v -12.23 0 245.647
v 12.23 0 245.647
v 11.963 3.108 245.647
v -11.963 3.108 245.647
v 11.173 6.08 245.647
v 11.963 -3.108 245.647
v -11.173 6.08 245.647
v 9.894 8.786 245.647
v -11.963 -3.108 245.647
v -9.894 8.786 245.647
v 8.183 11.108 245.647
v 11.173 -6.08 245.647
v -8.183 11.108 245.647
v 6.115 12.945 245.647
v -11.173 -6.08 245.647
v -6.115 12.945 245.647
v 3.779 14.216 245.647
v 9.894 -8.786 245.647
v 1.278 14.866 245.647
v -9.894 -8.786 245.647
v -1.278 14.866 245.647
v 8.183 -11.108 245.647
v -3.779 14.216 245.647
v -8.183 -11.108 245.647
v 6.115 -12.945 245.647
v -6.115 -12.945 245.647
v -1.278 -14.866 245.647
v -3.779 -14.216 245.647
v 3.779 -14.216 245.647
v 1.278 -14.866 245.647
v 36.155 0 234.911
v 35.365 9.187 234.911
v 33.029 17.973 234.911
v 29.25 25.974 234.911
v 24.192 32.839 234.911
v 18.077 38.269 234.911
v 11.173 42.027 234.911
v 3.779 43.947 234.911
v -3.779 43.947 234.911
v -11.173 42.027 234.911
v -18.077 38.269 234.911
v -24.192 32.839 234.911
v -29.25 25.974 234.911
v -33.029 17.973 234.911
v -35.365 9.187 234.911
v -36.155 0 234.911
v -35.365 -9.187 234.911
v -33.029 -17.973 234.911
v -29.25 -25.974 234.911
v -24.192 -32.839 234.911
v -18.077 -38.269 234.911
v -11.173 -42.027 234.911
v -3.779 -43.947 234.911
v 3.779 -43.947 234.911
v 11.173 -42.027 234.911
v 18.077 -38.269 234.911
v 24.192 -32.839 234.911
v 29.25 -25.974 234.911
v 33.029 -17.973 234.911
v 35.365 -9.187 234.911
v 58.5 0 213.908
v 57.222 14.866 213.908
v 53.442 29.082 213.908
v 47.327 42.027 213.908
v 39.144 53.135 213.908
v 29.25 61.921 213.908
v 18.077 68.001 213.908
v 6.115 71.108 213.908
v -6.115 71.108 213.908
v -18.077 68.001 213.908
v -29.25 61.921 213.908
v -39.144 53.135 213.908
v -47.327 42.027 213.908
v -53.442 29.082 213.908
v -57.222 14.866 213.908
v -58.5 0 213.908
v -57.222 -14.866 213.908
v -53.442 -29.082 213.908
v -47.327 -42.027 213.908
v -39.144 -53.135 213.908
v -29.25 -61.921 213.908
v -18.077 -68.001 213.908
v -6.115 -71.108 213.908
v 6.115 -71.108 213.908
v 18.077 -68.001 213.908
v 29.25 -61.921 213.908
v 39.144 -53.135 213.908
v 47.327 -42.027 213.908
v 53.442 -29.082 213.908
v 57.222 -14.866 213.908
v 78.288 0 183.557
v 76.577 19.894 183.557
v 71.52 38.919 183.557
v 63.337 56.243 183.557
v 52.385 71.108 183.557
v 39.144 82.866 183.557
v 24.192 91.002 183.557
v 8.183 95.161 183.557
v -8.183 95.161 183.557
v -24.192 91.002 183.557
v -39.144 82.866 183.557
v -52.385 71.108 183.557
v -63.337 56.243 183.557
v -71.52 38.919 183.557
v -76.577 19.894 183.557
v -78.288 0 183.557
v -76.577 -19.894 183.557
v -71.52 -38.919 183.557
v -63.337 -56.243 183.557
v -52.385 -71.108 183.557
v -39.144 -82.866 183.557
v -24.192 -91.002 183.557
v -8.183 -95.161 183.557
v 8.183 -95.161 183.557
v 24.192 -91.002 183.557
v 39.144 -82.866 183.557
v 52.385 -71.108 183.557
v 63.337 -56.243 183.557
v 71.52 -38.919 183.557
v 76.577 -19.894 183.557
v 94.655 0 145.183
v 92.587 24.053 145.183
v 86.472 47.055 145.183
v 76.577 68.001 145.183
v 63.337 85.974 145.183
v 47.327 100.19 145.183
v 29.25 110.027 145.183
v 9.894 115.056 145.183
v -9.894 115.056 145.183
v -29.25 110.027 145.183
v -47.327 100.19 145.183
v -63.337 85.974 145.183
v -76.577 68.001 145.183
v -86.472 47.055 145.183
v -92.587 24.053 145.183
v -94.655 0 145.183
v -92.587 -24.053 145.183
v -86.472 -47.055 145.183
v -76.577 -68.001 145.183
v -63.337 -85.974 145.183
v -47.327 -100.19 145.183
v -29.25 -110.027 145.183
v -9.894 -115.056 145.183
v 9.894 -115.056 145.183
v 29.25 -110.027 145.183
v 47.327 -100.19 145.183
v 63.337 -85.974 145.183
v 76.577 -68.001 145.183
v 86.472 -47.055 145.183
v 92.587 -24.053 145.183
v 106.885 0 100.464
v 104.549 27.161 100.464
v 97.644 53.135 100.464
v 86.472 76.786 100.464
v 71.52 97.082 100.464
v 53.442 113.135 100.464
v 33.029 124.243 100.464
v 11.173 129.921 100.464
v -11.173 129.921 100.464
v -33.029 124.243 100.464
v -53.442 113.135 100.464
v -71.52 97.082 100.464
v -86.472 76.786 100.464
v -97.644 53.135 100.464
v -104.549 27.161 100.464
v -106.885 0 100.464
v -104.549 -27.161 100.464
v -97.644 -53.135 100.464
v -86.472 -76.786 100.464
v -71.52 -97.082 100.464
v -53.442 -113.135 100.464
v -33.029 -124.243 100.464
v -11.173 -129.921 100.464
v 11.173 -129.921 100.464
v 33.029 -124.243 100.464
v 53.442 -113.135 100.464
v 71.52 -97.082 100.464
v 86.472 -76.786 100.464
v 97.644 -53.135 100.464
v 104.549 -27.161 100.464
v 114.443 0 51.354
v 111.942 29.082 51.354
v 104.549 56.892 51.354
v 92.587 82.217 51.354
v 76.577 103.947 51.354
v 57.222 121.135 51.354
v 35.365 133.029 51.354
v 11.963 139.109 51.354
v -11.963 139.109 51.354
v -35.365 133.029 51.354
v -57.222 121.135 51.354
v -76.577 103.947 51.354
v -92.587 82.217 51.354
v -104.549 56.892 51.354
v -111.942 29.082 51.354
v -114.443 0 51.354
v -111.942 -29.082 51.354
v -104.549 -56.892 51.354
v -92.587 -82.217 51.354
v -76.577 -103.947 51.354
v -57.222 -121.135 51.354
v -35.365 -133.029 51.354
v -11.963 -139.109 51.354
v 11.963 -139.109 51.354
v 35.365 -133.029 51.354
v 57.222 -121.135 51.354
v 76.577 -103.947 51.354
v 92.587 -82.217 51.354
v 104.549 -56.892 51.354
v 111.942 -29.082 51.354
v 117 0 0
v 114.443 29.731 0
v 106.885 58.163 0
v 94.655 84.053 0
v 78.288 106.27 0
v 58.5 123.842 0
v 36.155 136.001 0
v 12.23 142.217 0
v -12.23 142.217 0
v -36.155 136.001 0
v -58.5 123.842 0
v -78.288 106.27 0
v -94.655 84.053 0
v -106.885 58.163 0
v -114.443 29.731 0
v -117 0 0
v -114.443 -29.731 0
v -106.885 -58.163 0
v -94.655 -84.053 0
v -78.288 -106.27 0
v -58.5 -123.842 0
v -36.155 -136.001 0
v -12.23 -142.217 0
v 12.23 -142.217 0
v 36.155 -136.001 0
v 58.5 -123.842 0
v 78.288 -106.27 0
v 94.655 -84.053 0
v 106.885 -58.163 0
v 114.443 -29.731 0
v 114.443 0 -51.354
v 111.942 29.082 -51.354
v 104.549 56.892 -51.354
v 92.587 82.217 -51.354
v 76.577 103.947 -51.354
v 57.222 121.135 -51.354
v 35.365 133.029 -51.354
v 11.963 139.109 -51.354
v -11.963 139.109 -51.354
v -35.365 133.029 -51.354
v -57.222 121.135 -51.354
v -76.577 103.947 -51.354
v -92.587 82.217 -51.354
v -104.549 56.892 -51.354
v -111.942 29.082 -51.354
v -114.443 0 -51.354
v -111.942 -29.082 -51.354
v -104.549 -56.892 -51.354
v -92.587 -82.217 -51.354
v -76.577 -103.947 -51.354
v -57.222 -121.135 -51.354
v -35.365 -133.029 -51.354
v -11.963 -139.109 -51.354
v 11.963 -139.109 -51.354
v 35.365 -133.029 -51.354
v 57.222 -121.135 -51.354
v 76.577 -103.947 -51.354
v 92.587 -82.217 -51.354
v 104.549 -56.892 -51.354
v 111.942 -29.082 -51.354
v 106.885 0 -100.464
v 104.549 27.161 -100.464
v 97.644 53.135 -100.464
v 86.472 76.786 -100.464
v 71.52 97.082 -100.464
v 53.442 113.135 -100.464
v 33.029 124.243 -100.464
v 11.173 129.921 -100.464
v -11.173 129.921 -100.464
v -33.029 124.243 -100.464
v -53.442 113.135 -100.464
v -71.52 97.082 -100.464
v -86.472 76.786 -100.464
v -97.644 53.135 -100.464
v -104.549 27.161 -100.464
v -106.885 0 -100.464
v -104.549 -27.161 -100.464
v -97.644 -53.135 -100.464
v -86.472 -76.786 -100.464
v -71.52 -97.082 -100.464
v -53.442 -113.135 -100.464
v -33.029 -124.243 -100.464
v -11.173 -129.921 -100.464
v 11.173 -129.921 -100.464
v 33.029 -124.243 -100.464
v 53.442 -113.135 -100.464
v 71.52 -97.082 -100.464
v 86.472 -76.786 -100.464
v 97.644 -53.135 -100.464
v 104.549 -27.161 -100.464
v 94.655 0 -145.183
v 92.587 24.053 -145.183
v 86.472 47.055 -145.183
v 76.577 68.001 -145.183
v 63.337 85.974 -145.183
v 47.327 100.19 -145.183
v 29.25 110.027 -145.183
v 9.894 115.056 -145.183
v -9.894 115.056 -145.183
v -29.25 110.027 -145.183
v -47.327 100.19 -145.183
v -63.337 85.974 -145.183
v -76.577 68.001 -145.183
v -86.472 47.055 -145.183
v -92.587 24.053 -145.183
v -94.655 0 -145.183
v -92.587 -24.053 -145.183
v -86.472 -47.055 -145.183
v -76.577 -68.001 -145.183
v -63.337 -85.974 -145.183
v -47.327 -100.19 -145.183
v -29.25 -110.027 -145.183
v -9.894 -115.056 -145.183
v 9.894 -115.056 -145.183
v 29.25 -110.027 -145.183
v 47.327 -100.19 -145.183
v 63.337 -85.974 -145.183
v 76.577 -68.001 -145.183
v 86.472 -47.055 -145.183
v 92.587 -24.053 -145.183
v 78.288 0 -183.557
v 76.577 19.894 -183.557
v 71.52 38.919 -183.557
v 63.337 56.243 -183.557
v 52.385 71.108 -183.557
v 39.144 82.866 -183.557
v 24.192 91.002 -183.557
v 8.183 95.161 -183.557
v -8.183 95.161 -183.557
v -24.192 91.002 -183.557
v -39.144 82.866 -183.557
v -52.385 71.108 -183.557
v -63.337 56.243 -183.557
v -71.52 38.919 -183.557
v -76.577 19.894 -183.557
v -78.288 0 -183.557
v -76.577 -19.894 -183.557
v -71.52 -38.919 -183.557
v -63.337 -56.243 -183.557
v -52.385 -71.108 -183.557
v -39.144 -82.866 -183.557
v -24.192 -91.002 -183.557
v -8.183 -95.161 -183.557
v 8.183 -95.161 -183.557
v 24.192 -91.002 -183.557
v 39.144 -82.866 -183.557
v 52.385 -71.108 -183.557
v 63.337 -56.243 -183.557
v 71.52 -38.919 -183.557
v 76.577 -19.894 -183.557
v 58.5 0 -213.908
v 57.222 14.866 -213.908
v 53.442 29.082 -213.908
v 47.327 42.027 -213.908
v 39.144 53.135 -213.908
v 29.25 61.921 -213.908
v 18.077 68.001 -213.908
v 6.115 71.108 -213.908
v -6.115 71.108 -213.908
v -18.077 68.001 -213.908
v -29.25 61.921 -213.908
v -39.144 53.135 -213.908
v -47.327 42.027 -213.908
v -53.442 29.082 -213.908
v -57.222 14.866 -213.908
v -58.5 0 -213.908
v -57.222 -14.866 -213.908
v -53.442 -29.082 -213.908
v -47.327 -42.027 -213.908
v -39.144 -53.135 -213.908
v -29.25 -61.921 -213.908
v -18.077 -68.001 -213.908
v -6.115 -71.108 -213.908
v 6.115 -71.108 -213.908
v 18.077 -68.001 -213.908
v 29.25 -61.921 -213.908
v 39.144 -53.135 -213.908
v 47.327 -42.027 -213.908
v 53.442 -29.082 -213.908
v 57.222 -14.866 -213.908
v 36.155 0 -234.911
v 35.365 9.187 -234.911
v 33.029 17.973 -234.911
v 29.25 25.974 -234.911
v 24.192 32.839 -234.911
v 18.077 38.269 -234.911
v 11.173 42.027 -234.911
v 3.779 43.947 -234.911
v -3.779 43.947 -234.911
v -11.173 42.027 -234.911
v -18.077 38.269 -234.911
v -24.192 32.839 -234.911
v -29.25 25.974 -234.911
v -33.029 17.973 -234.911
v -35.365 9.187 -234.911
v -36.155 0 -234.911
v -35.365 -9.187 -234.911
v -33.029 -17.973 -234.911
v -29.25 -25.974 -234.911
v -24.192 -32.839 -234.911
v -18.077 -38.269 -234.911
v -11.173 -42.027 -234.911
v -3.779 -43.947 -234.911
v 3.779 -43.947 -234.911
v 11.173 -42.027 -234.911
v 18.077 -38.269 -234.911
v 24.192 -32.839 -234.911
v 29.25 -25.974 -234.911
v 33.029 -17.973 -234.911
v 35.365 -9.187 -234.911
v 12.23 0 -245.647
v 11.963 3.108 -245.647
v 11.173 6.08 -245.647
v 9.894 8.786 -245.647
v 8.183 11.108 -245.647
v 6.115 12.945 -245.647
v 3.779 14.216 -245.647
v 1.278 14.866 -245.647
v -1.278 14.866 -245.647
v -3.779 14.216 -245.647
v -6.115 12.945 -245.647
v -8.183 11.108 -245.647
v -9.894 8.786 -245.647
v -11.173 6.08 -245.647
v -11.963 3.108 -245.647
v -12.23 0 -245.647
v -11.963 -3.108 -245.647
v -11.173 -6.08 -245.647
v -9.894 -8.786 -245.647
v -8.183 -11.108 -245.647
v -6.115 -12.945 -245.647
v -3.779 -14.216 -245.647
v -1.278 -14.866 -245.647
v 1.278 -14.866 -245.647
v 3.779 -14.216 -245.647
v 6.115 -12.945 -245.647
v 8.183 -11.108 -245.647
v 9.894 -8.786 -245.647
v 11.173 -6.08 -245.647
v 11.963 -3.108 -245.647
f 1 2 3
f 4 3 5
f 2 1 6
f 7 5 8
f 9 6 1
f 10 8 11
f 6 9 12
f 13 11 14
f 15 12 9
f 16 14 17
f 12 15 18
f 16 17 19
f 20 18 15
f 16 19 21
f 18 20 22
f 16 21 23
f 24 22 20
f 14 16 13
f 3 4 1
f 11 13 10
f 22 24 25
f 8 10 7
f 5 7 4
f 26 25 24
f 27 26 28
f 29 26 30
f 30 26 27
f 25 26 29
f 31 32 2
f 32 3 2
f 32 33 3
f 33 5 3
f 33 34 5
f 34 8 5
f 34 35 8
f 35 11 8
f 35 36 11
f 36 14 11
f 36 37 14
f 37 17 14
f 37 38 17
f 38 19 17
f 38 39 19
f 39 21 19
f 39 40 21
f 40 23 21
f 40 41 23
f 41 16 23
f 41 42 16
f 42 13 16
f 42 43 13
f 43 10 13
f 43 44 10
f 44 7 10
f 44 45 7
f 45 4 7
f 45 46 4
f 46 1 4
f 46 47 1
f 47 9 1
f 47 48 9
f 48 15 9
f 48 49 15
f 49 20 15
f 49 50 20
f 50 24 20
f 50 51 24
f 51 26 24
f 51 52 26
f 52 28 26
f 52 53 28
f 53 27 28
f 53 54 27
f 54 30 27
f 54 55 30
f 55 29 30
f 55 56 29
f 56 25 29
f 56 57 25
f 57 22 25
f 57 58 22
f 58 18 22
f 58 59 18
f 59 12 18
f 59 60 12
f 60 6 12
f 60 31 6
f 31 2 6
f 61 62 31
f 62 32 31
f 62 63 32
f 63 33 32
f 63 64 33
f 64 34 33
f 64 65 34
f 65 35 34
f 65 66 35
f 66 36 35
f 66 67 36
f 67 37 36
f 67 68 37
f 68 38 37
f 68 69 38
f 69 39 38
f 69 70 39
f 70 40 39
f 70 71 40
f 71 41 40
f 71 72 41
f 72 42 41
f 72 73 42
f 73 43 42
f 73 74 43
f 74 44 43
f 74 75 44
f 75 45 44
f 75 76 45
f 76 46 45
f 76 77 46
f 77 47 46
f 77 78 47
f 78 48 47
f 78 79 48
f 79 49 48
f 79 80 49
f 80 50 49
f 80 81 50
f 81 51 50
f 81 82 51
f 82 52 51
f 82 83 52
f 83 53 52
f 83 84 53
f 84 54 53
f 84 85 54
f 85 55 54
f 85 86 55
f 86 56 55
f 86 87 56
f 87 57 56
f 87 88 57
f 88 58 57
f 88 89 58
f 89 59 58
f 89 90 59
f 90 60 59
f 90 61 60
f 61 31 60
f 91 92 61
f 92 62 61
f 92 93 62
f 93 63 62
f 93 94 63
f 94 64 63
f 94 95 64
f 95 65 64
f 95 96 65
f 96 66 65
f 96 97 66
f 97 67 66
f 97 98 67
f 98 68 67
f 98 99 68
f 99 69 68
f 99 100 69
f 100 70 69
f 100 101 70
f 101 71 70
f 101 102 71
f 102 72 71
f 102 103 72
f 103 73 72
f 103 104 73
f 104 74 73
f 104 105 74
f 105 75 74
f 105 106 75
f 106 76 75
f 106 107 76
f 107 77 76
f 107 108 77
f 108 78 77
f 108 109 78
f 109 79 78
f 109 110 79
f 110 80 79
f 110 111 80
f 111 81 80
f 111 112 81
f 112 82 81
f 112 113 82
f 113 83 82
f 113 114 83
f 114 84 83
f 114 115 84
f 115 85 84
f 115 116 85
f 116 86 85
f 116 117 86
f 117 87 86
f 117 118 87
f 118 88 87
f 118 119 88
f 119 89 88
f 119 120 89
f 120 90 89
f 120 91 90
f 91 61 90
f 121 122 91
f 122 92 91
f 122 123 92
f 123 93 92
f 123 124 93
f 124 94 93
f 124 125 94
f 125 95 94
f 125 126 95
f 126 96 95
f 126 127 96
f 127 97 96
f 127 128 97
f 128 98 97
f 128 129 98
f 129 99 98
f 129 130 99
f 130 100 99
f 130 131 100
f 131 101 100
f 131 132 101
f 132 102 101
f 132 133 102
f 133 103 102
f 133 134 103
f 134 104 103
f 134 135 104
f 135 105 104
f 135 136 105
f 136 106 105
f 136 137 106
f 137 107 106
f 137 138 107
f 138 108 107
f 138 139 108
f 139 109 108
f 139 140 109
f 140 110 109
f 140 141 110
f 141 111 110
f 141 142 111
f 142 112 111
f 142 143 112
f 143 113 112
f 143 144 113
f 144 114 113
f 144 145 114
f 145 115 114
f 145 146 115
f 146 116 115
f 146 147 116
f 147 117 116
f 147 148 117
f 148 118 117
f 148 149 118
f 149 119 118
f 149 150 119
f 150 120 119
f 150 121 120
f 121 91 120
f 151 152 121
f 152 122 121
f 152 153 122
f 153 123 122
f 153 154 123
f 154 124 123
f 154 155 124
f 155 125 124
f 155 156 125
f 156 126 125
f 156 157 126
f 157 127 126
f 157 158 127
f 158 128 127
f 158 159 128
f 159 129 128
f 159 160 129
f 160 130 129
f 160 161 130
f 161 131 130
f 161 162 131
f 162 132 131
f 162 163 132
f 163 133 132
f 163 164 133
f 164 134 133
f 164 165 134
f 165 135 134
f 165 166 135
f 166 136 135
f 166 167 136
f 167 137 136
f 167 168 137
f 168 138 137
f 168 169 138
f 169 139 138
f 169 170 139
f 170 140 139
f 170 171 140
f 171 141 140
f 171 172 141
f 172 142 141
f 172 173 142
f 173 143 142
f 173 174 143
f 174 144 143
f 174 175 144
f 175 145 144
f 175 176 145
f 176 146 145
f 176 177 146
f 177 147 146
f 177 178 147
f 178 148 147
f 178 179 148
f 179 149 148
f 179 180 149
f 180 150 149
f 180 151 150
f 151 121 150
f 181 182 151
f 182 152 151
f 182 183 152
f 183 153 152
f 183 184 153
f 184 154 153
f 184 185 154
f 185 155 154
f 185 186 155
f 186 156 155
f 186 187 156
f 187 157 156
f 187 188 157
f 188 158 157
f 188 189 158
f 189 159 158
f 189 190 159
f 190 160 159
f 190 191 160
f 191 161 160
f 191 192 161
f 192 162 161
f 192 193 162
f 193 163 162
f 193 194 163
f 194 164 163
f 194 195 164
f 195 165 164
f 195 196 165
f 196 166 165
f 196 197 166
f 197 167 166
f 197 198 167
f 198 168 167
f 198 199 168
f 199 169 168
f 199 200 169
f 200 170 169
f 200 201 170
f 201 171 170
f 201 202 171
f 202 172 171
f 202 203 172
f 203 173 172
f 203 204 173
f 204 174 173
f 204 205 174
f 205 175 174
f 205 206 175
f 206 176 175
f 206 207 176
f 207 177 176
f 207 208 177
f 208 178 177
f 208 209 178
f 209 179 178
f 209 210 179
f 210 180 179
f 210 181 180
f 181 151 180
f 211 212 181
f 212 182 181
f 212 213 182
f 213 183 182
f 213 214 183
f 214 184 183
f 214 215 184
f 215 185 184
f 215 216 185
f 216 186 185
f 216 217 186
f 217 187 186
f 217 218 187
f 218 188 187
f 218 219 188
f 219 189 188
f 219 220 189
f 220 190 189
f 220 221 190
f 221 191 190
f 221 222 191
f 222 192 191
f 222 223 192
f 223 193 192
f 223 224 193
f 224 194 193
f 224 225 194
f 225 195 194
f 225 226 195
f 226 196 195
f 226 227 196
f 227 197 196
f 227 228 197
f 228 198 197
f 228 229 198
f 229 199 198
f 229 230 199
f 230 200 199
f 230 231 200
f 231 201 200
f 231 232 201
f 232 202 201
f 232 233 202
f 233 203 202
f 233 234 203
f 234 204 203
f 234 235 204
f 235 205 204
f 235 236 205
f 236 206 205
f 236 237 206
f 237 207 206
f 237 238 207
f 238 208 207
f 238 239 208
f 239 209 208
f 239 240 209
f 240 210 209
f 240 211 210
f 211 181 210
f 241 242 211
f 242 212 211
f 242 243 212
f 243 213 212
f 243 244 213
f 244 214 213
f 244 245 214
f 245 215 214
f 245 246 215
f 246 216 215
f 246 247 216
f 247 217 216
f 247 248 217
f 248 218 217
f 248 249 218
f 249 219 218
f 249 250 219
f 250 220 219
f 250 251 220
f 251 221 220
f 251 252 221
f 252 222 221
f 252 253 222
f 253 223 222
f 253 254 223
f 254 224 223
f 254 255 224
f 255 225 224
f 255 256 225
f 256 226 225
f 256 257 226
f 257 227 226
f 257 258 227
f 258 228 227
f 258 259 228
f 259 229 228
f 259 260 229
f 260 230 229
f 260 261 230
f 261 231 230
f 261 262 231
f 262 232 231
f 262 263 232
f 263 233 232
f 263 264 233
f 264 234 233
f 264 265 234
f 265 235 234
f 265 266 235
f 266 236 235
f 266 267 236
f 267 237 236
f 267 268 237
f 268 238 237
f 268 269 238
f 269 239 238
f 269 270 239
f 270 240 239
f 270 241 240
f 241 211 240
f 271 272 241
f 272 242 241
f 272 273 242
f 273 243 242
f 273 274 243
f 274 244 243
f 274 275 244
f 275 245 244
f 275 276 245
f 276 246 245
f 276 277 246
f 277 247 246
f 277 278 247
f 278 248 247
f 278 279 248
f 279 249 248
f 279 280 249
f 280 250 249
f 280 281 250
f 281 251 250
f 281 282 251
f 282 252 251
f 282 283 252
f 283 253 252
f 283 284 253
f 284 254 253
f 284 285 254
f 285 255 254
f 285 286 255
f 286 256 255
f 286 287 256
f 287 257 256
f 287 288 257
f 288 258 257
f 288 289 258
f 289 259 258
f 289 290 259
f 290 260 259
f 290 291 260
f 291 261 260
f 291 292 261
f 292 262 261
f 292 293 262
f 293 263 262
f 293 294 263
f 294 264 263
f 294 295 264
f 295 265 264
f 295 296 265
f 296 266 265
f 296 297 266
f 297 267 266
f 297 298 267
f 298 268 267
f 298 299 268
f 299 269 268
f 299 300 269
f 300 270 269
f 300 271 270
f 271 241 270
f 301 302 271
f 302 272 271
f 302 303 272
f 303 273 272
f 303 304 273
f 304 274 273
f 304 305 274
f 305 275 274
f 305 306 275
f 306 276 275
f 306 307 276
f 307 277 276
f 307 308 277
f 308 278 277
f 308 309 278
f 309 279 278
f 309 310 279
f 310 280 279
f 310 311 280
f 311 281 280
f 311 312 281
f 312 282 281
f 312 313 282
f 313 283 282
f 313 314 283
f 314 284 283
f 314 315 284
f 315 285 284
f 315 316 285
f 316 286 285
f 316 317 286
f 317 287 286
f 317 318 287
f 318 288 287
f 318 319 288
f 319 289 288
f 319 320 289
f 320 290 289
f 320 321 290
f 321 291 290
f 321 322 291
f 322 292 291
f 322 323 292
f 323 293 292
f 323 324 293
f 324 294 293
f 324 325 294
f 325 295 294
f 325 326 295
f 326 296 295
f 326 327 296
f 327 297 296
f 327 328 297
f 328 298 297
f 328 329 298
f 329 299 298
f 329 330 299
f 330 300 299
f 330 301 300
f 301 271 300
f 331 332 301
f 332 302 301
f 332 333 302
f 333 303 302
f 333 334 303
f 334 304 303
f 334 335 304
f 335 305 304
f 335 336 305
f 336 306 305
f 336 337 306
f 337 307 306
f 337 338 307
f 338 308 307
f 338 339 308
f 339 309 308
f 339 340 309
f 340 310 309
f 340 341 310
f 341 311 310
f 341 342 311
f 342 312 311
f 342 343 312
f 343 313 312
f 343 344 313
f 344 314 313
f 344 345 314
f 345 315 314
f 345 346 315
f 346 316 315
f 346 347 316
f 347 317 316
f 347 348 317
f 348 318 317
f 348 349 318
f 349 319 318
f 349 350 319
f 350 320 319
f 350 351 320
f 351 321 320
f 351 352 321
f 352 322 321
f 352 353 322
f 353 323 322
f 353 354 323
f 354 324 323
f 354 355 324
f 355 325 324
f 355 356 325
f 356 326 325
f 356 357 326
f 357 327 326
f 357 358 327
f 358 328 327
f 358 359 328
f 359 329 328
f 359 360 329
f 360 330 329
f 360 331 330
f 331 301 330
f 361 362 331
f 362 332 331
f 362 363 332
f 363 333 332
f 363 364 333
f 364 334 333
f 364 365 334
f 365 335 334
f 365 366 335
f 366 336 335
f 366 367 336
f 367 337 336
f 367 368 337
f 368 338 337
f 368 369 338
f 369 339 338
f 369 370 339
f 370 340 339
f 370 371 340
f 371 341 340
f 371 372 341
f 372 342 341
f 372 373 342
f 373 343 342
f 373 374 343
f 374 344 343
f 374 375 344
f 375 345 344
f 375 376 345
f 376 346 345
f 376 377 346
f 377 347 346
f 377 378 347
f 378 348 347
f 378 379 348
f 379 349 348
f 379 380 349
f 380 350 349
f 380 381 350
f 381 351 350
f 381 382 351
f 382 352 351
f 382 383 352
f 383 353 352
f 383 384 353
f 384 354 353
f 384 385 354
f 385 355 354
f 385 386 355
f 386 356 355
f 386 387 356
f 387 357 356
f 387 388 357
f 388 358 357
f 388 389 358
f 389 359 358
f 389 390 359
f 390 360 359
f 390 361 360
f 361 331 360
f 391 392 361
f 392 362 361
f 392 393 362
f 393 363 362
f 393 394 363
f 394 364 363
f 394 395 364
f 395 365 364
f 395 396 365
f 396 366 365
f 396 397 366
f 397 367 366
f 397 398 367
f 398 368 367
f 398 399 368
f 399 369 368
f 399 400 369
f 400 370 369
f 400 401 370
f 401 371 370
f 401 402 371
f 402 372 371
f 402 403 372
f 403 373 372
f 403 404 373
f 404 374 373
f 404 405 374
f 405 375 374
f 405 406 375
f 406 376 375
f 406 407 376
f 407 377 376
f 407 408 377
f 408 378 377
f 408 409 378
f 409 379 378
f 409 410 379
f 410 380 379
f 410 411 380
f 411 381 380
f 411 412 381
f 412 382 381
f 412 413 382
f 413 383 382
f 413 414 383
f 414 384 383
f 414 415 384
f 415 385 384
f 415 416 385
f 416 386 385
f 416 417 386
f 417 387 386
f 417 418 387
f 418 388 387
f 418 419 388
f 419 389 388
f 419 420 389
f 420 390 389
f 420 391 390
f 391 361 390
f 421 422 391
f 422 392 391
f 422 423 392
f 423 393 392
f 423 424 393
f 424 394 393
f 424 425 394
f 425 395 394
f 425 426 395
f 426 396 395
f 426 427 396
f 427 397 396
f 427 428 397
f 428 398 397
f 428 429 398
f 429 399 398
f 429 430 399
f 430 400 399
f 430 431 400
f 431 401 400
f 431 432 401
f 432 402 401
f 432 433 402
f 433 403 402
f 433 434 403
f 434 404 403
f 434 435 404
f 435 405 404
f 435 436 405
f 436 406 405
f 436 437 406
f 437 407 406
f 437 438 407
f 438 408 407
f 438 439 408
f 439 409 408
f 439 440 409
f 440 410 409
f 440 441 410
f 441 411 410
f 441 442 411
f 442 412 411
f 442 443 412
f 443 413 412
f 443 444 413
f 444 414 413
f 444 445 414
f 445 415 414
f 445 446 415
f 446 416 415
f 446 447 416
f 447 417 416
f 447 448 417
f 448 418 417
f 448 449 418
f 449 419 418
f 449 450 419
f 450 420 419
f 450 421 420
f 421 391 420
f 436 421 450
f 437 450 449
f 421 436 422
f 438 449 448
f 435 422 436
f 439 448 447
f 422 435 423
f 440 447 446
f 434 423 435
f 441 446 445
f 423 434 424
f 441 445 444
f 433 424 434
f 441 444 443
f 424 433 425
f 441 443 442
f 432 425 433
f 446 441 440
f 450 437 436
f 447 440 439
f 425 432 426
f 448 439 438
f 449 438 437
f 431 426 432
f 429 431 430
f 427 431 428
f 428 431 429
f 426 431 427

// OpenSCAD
// Generated by SolidPython 1.0.1 on 2020-07-29 00:46:48


scale(v = [9, 11, 19]) {
	sphere(r = 13);
}
/***********************************************
*********      SolidPython code:      **********
************************************************
 
# import packages: SolidPython
from solid import *
from solid.utils import *
from itertools import chain, combinations, permutations


class Resize:

    def __init__(self, scad_file):
        self.scad_file = scad_file
        #self.scad_file = import_scad(scad_file)
        # cone/cylinder param:
        self.r1 = 0
        self.r2 = 0
        self.h = 0
        # rectangular prism param:
        self.w = 0
        self.l = 0
        # ellipse param:
        self.r = 0

    # import OpenScad code (file name corresponds to shape)


    # classify shape + parameters
    def assign(self, param1, param2, param3):
        if self.scad_file == 'cone.scad':
            self.r1 = param1
            self.r2 = param2
            self.h = param3
        elif self.scad_file == 'cylinder.scad':
            self.r1 = param1
            self.r2 = param2
            self.h = param3
        elif self.scad_file == 'rectangularPrism.scad':
            self.h = param1
            self.l = param2
            self.w = param3
        else:
            self.r = param1
            self.h = param2

    # resize parameters
    def iterate(self):
        x = range(3, 20, 2)
        i = 1
        if self.scad_file == 'cone.scad':
            tempList = list(permutations(x, 2))
            for temp in tempList:
                param1 = temp[0]
                param2 = temp[1]
                filepath = 'produced_scad_files/' + 'cone' + str(param1) + '_' + str(param2) + '_' + '.scad'
                scad_render_to_file(cylinder(h=param1, r1=param2, r2=0), filepath)

        elif self.scad_file == 'cylinder.scad':
            tempList = list(permutations(x, 3))
            for temp in tempList:
                param1 = temp[0]
                param2 = temp[1]
                filepath = 'produced_scad_files/' + 'cylinder' + str(param1) + '_' + str(param2) + '_' + '.scad'
                scad_render_to_file(cylinder(h=param1, r1=param2, r2=param2), filepath)

        elif self.scad_file == 'rectangularPrism.scad':
            tempList = list(permutations(x, 3))
            for temp in tempList:
                param1 = temp[0]
                param2 = temp[1]
                param3 = temp[2]
                filepath = 'produced_scad_files/' + 'rectangularPrism' + str(param1) + '_' + str(param2) + '_' + str(
                    param3) + '.scad'
                scad_render_to_file(cube(size=(param1, param2, param3)), filepath)

        elif self.scad_file == 'ellipse.scad':
            tempList = list(permutations(x, 4))
            for temp in tempList:
                param1 = temp[0]
                param2 = temp[1]
                param3 = temp[2]
                param4 = temp[3]
                filepath = 'produced_scad_files/' + 'ellipse' + str(param1) + '_' + str(param2) + '_' + str(param3) + '_' + str(param4) + '.scad'
                scad_render_to_file(scale([param1, param2, param3])(sphere(r=param4)), filepath)

    def render_to_scadfile(self):
        scad_render_to_file(scad, 'example.scad') 
 
************************************************/
